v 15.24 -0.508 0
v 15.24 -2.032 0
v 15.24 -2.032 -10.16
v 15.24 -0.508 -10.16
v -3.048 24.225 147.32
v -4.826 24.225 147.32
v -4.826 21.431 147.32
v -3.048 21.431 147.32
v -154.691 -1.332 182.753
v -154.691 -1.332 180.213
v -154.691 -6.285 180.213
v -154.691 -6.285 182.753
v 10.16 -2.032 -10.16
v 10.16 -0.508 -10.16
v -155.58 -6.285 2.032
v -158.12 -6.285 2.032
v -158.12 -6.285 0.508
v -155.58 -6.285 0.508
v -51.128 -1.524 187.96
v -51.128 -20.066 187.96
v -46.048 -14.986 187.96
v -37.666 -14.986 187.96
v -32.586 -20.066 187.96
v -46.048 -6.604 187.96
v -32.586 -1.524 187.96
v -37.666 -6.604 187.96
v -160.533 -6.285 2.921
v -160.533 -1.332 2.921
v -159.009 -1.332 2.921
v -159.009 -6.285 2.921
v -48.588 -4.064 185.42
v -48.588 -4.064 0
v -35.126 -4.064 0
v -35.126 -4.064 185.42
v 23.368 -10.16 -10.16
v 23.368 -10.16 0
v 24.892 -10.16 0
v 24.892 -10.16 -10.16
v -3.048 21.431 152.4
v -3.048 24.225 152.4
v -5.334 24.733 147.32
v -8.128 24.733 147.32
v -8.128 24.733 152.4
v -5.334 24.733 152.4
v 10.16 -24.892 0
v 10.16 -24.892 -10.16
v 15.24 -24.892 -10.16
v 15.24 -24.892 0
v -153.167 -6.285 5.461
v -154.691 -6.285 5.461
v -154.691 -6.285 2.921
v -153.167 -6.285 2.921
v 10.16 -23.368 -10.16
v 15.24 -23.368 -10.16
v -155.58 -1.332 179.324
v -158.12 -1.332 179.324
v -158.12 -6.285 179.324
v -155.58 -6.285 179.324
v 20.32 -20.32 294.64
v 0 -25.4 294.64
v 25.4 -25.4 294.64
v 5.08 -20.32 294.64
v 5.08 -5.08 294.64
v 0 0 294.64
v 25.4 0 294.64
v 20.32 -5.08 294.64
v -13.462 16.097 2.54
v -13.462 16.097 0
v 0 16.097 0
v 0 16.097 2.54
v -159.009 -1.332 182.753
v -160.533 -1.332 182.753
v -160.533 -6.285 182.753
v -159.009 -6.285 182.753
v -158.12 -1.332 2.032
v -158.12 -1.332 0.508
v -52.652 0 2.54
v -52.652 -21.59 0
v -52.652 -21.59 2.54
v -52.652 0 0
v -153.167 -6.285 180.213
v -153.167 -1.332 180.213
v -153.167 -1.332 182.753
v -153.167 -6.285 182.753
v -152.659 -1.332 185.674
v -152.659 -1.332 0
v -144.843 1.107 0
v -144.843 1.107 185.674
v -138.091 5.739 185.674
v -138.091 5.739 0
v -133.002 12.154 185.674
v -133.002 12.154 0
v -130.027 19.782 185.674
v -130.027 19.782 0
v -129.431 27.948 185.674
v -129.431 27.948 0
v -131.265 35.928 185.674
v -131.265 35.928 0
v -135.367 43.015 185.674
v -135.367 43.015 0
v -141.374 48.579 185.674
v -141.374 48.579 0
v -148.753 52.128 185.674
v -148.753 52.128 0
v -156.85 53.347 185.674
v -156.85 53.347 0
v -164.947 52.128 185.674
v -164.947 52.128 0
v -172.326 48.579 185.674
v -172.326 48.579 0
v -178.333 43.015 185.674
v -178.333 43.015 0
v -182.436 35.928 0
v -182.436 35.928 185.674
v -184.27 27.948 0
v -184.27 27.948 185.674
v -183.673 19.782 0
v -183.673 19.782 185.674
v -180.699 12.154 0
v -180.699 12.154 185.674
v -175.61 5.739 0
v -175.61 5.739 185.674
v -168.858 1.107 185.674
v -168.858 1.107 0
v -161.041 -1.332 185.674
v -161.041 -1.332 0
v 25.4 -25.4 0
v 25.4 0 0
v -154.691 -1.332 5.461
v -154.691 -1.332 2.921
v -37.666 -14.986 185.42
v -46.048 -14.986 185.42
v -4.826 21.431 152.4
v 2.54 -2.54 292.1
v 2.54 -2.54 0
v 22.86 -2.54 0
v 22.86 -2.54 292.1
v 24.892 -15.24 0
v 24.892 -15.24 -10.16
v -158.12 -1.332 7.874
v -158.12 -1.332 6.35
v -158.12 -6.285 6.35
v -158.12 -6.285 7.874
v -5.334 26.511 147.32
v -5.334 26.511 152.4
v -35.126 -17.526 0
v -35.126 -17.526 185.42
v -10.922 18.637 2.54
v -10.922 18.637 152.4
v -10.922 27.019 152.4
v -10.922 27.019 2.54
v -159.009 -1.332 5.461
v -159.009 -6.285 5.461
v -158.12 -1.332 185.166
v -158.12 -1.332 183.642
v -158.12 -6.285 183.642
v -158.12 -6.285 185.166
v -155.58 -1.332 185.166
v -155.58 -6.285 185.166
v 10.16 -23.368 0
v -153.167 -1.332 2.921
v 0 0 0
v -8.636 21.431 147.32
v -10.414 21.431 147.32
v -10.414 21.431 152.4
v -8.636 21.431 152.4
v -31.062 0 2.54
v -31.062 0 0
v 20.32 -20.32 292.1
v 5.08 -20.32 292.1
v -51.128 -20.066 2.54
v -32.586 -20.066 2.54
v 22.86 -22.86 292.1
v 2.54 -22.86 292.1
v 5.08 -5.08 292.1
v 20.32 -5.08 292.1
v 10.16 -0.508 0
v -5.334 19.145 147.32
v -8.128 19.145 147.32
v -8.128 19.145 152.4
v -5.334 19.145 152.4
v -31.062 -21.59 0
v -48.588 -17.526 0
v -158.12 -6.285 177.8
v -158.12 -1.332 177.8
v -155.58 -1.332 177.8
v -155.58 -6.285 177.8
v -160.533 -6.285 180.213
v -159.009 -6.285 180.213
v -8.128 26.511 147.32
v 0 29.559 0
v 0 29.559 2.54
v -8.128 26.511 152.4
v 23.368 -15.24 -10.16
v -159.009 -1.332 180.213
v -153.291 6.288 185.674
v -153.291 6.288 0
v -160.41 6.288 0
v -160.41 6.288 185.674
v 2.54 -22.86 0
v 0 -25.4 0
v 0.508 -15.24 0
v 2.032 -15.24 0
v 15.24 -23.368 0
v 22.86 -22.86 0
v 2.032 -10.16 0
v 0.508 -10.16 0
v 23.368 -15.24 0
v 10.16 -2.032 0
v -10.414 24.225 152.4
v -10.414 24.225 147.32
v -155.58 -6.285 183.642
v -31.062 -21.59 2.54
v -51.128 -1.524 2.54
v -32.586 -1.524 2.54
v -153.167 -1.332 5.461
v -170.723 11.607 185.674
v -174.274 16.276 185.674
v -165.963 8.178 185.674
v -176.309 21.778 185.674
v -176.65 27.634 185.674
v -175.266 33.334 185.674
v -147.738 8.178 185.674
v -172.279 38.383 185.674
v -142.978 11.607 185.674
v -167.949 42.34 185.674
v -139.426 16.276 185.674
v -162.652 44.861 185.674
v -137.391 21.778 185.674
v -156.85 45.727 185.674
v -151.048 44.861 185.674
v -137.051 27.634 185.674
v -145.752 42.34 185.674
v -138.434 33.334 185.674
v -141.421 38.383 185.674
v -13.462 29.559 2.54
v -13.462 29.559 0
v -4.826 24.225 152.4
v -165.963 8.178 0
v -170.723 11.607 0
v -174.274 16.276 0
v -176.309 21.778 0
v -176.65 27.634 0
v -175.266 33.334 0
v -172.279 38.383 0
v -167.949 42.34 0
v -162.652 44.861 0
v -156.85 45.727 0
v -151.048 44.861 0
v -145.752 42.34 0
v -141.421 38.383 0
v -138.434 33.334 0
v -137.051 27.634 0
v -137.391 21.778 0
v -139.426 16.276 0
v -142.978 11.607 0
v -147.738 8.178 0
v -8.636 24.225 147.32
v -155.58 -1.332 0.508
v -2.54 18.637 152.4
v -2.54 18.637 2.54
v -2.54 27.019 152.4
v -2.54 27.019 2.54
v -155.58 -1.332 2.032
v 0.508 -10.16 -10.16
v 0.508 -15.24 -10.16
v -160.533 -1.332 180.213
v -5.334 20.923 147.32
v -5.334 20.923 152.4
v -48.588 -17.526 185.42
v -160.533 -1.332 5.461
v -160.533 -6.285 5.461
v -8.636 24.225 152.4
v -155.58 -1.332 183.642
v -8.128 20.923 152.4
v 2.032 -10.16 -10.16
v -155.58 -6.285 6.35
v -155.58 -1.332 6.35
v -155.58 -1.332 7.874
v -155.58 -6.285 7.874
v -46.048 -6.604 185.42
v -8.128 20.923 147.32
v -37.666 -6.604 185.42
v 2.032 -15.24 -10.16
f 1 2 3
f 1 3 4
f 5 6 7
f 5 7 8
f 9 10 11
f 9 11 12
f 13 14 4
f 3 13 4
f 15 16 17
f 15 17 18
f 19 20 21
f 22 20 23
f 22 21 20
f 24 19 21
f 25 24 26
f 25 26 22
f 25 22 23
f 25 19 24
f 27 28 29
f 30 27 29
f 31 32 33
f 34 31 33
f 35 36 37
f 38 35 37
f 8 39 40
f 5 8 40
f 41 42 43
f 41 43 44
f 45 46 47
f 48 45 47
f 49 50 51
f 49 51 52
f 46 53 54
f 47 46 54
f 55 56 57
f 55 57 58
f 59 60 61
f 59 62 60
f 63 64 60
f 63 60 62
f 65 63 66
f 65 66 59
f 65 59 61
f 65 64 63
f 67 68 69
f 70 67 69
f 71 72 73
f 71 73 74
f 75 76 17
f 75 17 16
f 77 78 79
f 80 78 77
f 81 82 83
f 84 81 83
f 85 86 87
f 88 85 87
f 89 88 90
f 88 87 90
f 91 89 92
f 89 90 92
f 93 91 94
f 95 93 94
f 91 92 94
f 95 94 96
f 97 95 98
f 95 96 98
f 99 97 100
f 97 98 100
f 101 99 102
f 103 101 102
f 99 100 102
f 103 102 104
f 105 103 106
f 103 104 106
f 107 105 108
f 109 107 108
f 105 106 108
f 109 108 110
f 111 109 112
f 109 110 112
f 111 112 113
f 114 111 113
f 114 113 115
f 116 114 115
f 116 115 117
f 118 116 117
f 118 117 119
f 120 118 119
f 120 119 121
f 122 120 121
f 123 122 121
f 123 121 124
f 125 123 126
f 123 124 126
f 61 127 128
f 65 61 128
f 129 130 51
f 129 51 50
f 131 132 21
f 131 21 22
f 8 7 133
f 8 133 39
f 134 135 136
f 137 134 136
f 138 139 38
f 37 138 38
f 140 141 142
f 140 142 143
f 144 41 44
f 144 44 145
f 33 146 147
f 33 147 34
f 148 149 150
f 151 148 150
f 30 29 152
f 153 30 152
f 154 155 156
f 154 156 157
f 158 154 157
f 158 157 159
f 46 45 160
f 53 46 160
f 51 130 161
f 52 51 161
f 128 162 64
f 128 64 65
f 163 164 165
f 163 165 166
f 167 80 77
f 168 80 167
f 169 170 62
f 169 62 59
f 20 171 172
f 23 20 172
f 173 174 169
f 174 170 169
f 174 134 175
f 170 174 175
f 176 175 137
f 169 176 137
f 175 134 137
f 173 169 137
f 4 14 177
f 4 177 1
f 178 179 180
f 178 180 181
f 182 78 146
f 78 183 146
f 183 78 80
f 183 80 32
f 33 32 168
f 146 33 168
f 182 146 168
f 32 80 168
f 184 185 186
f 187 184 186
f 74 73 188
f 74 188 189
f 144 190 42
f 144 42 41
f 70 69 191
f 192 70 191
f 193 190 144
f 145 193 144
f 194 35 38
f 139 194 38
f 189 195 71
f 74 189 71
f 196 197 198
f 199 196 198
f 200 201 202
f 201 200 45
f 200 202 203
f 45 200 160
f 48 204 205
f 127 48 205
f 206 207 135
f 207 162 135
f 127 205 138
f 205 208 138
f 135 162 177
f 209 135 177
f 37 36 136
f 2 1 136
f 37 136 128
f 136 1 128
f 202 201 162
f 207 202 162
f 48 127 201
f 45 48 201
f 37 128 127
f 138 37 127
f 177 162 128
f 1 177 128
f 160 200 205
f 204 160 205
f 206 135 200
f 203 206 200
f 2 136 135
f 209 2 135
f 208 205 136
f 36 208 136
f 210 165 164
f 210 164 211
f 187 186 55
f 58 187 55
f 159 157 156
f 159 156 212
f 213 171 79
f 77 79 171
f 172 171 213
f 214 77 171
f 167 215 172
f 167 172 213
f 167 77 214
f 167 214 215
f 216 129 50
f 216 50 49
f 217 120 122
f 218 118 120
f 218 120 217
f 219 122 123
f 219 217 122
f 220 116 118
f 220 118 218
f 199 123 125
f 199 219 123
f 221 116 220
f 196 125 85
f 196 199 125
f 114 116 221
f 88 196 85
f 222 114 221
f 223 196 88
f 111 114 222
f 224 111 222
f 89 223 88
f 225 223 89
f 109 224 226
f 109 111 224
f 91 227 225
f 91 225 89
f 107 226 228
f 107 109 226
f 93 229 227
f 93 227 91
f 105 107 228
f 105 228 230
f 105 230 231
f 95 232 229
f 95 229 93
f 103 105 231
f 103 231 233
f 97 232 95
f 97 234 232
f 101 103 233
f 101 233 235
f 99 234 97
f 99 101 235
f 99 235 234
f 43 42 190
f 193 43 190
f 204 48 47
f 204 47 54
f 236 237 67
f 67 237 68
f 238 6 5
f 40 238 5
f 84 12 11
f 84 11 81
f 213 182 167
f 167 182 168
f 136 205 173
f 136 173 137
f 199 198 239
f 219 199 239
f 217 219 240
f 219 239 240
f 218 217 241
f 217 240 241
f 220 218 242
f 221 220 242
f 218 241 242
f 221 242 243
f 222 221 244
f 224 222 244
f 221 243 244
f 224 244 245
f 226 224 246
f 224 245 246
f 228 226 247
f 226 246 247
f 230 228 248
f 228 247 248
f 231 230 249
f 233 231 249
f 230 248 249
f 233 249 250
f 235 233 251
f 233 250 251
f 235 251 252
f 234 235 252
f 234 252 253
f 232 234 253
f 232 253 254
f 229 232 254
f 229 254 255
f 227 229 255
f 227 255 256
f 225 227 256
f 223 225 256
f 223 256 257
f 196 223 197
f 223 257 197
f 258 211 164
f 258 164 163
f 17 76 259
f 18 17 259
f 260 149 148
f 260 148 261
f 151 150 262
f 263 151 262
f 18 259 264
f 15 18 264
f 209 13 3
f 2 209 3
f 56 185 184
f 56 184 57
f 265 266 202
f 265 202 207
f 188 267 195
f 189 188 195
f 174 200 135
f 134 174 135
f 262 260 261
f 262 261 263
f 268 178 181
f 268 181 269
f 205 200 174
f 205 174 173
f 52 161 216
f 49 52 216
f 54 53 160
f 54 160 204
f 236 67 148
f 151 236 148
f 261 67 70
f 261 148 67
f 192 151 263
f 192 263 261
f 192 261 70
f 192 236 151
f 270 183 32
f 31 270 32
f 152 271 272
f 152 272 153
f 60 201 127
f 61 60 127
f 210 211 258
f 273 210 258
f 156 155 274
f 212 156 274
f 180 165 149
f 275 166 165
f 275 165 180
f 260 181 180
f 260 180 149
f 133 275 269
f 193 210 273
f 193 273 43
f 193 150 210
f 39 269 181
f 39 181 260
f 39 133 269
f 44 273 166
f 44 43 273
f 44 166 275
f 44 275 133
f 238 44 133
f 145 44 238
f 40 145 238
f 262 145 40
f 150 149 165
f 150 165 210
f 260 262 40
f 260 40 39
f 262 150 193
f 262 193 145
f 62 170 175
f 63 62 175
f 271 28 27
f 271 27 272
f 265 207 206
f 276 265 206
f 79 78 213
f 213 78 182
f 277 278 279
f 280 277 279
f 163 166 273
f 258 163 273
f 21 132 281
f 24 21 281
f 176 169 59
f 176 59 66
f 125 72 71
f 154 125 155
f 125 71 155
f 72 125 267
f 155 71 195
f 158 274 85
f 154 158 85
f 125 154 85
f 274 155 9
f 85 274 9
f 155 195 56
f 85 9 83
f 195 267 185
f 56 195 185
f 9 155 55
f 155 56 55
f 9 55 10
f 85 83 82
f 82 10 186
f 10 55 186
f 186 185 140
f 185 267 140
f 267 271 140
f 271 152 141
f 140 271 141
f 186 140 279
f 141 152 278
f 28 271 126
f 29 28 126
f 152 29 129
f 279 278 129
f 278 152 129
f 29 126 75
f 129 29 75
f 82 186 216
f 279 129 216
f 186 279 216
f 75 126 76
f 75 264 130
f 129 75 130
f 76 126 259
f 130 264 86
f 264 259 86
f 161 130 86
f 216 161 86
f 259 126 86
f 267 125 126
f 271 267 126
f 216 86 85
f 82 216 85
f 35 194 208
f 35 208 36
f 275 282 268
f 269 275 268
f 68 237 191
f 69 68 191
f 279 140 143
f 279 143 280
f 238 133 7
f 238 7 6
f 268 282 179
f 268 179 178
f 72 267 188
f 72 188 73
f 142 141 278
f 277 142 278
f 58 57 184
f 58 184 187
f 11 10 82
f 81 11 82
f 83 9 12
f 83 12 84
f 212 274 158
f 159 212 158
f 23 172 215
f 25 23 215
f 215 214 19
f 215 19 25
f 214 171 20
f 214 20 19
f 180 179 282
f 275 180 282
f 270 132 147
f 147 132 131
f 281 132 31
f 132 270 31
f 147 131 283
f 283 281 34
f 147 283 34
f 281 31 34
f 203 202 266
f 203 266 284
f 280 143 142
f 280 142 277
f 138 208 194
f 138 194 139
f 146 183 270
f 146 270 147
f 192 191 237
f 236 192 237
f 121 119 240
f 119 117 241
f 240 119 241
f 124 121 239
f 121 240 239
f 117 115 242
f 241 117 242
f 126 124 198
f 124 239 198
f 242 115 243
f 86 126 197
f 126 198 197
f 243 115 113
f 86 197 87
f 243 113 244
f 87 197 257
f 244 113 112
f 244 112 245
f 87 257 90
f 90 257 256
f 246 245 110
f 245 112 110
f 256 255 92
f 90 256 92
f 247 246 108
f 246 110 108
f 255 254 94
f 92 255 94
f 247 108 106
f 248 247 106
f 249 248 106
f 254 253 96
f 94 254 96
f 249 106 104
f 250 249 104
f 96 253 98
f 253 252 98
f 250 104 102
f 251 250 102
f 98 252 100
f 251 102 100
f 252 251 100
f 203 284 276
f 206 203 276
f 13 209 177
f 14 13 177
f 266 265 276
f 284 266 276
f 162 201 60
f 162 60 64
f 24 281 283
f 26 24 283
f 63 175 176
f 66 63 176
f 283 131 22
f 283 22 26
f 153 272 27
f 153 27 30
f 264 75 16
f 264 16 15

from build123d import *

# Parameters (mm, degrees)
F0_W      = 25.4
F0_H      = 25.4
F0_W_2    = 5.08
F0_H_2    = 1.524
F0_W_3    = 1.524
F0_H_3    = 5.08
F0_W_4    = 20.32
F0_H_4    = 20.32
F0_W_5    = 15.24
F0_H_5    = 15.24
F1_DEPTH  = 294.64
F2_DEPTH  = 292.1
F0_W_6    = 18.542
F0_H_6    = 18.542
F0_W_7    = 13.462
F0_H_7    = 13.462
F0_W_8    = 8.382
F0_H_8    = 8.382
F3_DEPTH  = 187.96
F4_DEPTH  = 185.42
F0_W_9    = 21.59
F0_H_9    = 21.59
F5_DEPTH  = 2.54
F6_DEPTH  = 10.16
F7_DEPTH  = 185.674
F8_W      = 1.524
F8_H      = 2.54
F8_W_2    = 2.54
F8_H_2    = 1.524
F9_DEPTH  = 4.953
F0_W_10   = 2.794
F0_H_10   = 1.778
F0_W_11   = 1.778
F0_H_11   = 2.794
F10_DEPTH = 152.4
F11_DEPTH = 147.32


with BuildPart() as f1:
    # F0 (on Top) → F1 (new body)
    with BuildSketch(Plane.XY):
        with Locations((12.7, -12.7)):
            Rectangle(F0_W, F0_H)
        with Locations((12.7, -24.13)):
            Rectangle(F0_W_2, F0_H_2, mode=Mode.SUBTRACT)
        with Locations((1.27, -12.7)):
            Rectangle(F0_W_3, F0_H_3, mode=Mode.SUBTRACT)
        with Locations((12.7, -12.7)):
            Rectangle(F0_W_4, F0_H_4, mode=Mode.SUBTRACT)
        with Locations((24.13, -12.7)):
            Rectangle(F0_W_3, F0_H_3, mode=Mode.SUBTRACT)
        with Locations((12.7, -1.27)):
            Rectangle(F0_W_2, F0_H_2, mode=Mode.SUBTRACT)
        with Locations((12.7, -12.7)):
            Rectangle(F0_W_4, F0_H_4)
        with Locations((12.7, -12.7)):
            Rectangle(F0_W_5, F0_H_5, mode=Mode.SUBTRACT)
        with Locations((1.27, -12.7)):
            Rectangle(F0_W_3, F0_H_3)
        with Locations((12.7, -24.13)):
            Rectangle(F0_W_2, F0_H_2)
        with Locations((24.13, -12.7)):
            Rectangle(F0_W_3, F0_H_3)
        with Locations((12.7, -1.27)):
            Rectangle(F0_W_2, F0_H_2)
    extrude(amount=F1_DEPTH)

    # F0 (on Top) → F2 (cut)
    with BuildSketch(Plane.XY):
        with Locations((12.7, -12.7)):
            Rectangle(F0_W_4, F0_H_4)
        with Locations((12.7, -12.7)):
            Rectangle(F0_W_5, F0_H_5, mode=Mode.SUBTRACT)
    extrude(amount=F2_DEPTH, mode=Mode.SUBTRACT)

    # F0 (on Top) → F6 (join)
    with BuildSketch(Plane.XY):
        with Locations((1.27, -12.7)):
            Rectangle(F0_W_3, F0_H_3)
        with Locations((12.7, -24.13)):
            Rectangle(F0_W_2, F0_H_2)
        with Locations((12.7, -1.27)):
            Rectangle(F0_W_2, F0_H_2)
        with Locations((24.13, -12.7)):
            Rectangle(F0_W_3, F0_H_3)
    extrude(amount=-F6_DEPTH)


with BuildPart() as f3:
    # F0 (on Top) → F3 (new body)
    with BuildSketch(Plane.XY):
        with Locations((-41.8567406106, -10.795)):
            Rectangle(F0_W_6, F0_H_6)
        with Locations((-41.8567406106, -10.795)):
            Rectangle(F0_W_7, F0_H_7, mode=Mode.SUBTRACT)
        with Locations((-41.8567406106, -10.795)):
            Rectangle(F0_W_7, F0_H_7)
        with Locations((-41.8567406106, -10.795)):
            Rectangle(F0_W_8, F0_H_8, mode=Mode.SUBTRACT)
    extrude(amount=F3_DEPTH)

    # F0 (on Top) → F4 (cut)
    with BuildSketch(Plane.XY):
        with Locations((-41.8567406106, -10.795)):
            Rectangle(F0_W_7, F0_H_7)
        with Locations((-41.8567406106, -10.795)):
            Rectangle(F0_W_8, F0_H_8, mode=Mode.SUBTRACT)
    extrude(amount=F4_DEPTH, mode=Mode.SUBTRACT)

    # F0 (on Top) → F5 (join)
    with BuildSketch(Plane.XY):
        with Locations((-41.8567406106, -10.795)):
            Rectangle(F0_W_9, F0_H_9)
        with Locations((-41.8567406106, -10.795)):
            Rectangle(F0_W_6, F0_H_6, mode=Mode.SUBTRACT)
    extrude(amount=F5_DEPTH)


with BuildPart() as f5:
    # F0 (on Top) → F5, piece 2 (new body)
    with BuildSketch(Plane.XY):
        Polygon((0, 16.0971526057), (0, 29.5591526057), (-1.27, 29.5591526057), (-10.922, 29.5591526057), (-13.462, 29.5591526057), (-13.462, 16.0971526057), align=None)
        with Locations((-6.731, 22.8281526057)):
            Rectangle(F0_W_8, F0_H_8, mode=Mode.SUBTRACT)
    extrude(amount=F5_DEPTH)

    # F0 (on Top) → F10 (join)
    with BuildSketch(Plane.XY):
        with Locations((-6.731, 22.8281526057)):
            Rectangle(F0_W_8, F0_H_8)
        with Locations((-6.731, 20.0341526057)):
            Rectangle(F0_W_10, F0_H_10, mode=Mode.SUBTRACT)
        with Locations((-9.525, 22.8281526057)):
            Rectangle(F0_W_11, F0_H_11, mode=Mode.SUBTRACT)
        with Locations((-3.937, 22.8281526057)):
            Rectangle(F0_W_11, F0_H_11, mode=Mode.SUBTRACT)
        with Locations((-6.731, 25.6221526057)):
            Rectangle(F0_W_10, F0_H_10, mode=Mode.SUBTRACT)
    extrude(amount=F10_DEPTH)

    # F0 (on Top) → F11 (join)
    with BuildSketch(Plane.XY):
        with Locations((-6.731, 20.0341526057)):
            Rectangle(F0_W_10, F0_H_10)
        with Locations((-9.525, 22.8281526057)):
            Rectangle(F0_W_11, F0_H_11)
        with Locations((-6.731, 25.6221526057)):
            Rectangle(F0_W_10, F0_H_10)
        with Locations((-3.937, 22.8281526057)):
            Rectangle(F0_W_11, F0_H_11)
    extrude(amount=F11_DEPTH)


with BuildPart() as f7:
    # F0 (on Top) → F7 (new body)
    with BuildSketch(Plane.XY):
        with BuildLine():
            Line((-161.0411958579, -1.3319319991), (-152.6591958579, -1.3319319991))
            ThreePointArc((-152.6591958579, -1.3319319991), (-156.8501958579, 53.3468376383), (-161.0411958579, -1.3319319991))
        make_face()
        with BuildLine():
            ThreePointArc((-160.409539937, 6.2880680009), (-156.8501958579, 45.7268376383), (-153.2908517788, 6.2880680009))
            Line((-153.2908517788, 6.2880680009), (-160.409539937, 6.2880680009))
        make_face(mode=Mode.SUBTRACT)
    extrude(amount=F7_DEPTH)

    # F8 (on face) → F9 (join)
    with BuildSketch(Plane.XZ.offset(1.3319319991)):
        with Locations((-159.7711958579, 181.483)):
            Rectangle(F8_W, F8_H)
        with Locations((-156.8501958579, 184.404)):
            Rectangle(F8_W_2, F8_H_2)
        with Locations((-153.9291958579, 181.483)):
            Rectangle(F8_W, F8_H)
        with Locations((-156.8501958579, 178.562)):
            Rectangle(F8_W_2, F8_H_2)
        with Locations((-159.7711958579, 4.191)):
            Rectangle(F8_W, F8_H)
        with Locations((-156.8501958579, 7.112)):
            Rectangle(F8_W_2, F8_H_2)
        with Locations((-153.9291958579, 4.191)):
            Rectangle(F8_W, F8_H)
        with Locations((-156.8501958579, 1.27)):
            Rectangle(F8_W_2, F8_H_2)
    extrude(amount=F9_DEPTH)


solid = Compound([f1.part, f3.part, f5.part, f7.part])
